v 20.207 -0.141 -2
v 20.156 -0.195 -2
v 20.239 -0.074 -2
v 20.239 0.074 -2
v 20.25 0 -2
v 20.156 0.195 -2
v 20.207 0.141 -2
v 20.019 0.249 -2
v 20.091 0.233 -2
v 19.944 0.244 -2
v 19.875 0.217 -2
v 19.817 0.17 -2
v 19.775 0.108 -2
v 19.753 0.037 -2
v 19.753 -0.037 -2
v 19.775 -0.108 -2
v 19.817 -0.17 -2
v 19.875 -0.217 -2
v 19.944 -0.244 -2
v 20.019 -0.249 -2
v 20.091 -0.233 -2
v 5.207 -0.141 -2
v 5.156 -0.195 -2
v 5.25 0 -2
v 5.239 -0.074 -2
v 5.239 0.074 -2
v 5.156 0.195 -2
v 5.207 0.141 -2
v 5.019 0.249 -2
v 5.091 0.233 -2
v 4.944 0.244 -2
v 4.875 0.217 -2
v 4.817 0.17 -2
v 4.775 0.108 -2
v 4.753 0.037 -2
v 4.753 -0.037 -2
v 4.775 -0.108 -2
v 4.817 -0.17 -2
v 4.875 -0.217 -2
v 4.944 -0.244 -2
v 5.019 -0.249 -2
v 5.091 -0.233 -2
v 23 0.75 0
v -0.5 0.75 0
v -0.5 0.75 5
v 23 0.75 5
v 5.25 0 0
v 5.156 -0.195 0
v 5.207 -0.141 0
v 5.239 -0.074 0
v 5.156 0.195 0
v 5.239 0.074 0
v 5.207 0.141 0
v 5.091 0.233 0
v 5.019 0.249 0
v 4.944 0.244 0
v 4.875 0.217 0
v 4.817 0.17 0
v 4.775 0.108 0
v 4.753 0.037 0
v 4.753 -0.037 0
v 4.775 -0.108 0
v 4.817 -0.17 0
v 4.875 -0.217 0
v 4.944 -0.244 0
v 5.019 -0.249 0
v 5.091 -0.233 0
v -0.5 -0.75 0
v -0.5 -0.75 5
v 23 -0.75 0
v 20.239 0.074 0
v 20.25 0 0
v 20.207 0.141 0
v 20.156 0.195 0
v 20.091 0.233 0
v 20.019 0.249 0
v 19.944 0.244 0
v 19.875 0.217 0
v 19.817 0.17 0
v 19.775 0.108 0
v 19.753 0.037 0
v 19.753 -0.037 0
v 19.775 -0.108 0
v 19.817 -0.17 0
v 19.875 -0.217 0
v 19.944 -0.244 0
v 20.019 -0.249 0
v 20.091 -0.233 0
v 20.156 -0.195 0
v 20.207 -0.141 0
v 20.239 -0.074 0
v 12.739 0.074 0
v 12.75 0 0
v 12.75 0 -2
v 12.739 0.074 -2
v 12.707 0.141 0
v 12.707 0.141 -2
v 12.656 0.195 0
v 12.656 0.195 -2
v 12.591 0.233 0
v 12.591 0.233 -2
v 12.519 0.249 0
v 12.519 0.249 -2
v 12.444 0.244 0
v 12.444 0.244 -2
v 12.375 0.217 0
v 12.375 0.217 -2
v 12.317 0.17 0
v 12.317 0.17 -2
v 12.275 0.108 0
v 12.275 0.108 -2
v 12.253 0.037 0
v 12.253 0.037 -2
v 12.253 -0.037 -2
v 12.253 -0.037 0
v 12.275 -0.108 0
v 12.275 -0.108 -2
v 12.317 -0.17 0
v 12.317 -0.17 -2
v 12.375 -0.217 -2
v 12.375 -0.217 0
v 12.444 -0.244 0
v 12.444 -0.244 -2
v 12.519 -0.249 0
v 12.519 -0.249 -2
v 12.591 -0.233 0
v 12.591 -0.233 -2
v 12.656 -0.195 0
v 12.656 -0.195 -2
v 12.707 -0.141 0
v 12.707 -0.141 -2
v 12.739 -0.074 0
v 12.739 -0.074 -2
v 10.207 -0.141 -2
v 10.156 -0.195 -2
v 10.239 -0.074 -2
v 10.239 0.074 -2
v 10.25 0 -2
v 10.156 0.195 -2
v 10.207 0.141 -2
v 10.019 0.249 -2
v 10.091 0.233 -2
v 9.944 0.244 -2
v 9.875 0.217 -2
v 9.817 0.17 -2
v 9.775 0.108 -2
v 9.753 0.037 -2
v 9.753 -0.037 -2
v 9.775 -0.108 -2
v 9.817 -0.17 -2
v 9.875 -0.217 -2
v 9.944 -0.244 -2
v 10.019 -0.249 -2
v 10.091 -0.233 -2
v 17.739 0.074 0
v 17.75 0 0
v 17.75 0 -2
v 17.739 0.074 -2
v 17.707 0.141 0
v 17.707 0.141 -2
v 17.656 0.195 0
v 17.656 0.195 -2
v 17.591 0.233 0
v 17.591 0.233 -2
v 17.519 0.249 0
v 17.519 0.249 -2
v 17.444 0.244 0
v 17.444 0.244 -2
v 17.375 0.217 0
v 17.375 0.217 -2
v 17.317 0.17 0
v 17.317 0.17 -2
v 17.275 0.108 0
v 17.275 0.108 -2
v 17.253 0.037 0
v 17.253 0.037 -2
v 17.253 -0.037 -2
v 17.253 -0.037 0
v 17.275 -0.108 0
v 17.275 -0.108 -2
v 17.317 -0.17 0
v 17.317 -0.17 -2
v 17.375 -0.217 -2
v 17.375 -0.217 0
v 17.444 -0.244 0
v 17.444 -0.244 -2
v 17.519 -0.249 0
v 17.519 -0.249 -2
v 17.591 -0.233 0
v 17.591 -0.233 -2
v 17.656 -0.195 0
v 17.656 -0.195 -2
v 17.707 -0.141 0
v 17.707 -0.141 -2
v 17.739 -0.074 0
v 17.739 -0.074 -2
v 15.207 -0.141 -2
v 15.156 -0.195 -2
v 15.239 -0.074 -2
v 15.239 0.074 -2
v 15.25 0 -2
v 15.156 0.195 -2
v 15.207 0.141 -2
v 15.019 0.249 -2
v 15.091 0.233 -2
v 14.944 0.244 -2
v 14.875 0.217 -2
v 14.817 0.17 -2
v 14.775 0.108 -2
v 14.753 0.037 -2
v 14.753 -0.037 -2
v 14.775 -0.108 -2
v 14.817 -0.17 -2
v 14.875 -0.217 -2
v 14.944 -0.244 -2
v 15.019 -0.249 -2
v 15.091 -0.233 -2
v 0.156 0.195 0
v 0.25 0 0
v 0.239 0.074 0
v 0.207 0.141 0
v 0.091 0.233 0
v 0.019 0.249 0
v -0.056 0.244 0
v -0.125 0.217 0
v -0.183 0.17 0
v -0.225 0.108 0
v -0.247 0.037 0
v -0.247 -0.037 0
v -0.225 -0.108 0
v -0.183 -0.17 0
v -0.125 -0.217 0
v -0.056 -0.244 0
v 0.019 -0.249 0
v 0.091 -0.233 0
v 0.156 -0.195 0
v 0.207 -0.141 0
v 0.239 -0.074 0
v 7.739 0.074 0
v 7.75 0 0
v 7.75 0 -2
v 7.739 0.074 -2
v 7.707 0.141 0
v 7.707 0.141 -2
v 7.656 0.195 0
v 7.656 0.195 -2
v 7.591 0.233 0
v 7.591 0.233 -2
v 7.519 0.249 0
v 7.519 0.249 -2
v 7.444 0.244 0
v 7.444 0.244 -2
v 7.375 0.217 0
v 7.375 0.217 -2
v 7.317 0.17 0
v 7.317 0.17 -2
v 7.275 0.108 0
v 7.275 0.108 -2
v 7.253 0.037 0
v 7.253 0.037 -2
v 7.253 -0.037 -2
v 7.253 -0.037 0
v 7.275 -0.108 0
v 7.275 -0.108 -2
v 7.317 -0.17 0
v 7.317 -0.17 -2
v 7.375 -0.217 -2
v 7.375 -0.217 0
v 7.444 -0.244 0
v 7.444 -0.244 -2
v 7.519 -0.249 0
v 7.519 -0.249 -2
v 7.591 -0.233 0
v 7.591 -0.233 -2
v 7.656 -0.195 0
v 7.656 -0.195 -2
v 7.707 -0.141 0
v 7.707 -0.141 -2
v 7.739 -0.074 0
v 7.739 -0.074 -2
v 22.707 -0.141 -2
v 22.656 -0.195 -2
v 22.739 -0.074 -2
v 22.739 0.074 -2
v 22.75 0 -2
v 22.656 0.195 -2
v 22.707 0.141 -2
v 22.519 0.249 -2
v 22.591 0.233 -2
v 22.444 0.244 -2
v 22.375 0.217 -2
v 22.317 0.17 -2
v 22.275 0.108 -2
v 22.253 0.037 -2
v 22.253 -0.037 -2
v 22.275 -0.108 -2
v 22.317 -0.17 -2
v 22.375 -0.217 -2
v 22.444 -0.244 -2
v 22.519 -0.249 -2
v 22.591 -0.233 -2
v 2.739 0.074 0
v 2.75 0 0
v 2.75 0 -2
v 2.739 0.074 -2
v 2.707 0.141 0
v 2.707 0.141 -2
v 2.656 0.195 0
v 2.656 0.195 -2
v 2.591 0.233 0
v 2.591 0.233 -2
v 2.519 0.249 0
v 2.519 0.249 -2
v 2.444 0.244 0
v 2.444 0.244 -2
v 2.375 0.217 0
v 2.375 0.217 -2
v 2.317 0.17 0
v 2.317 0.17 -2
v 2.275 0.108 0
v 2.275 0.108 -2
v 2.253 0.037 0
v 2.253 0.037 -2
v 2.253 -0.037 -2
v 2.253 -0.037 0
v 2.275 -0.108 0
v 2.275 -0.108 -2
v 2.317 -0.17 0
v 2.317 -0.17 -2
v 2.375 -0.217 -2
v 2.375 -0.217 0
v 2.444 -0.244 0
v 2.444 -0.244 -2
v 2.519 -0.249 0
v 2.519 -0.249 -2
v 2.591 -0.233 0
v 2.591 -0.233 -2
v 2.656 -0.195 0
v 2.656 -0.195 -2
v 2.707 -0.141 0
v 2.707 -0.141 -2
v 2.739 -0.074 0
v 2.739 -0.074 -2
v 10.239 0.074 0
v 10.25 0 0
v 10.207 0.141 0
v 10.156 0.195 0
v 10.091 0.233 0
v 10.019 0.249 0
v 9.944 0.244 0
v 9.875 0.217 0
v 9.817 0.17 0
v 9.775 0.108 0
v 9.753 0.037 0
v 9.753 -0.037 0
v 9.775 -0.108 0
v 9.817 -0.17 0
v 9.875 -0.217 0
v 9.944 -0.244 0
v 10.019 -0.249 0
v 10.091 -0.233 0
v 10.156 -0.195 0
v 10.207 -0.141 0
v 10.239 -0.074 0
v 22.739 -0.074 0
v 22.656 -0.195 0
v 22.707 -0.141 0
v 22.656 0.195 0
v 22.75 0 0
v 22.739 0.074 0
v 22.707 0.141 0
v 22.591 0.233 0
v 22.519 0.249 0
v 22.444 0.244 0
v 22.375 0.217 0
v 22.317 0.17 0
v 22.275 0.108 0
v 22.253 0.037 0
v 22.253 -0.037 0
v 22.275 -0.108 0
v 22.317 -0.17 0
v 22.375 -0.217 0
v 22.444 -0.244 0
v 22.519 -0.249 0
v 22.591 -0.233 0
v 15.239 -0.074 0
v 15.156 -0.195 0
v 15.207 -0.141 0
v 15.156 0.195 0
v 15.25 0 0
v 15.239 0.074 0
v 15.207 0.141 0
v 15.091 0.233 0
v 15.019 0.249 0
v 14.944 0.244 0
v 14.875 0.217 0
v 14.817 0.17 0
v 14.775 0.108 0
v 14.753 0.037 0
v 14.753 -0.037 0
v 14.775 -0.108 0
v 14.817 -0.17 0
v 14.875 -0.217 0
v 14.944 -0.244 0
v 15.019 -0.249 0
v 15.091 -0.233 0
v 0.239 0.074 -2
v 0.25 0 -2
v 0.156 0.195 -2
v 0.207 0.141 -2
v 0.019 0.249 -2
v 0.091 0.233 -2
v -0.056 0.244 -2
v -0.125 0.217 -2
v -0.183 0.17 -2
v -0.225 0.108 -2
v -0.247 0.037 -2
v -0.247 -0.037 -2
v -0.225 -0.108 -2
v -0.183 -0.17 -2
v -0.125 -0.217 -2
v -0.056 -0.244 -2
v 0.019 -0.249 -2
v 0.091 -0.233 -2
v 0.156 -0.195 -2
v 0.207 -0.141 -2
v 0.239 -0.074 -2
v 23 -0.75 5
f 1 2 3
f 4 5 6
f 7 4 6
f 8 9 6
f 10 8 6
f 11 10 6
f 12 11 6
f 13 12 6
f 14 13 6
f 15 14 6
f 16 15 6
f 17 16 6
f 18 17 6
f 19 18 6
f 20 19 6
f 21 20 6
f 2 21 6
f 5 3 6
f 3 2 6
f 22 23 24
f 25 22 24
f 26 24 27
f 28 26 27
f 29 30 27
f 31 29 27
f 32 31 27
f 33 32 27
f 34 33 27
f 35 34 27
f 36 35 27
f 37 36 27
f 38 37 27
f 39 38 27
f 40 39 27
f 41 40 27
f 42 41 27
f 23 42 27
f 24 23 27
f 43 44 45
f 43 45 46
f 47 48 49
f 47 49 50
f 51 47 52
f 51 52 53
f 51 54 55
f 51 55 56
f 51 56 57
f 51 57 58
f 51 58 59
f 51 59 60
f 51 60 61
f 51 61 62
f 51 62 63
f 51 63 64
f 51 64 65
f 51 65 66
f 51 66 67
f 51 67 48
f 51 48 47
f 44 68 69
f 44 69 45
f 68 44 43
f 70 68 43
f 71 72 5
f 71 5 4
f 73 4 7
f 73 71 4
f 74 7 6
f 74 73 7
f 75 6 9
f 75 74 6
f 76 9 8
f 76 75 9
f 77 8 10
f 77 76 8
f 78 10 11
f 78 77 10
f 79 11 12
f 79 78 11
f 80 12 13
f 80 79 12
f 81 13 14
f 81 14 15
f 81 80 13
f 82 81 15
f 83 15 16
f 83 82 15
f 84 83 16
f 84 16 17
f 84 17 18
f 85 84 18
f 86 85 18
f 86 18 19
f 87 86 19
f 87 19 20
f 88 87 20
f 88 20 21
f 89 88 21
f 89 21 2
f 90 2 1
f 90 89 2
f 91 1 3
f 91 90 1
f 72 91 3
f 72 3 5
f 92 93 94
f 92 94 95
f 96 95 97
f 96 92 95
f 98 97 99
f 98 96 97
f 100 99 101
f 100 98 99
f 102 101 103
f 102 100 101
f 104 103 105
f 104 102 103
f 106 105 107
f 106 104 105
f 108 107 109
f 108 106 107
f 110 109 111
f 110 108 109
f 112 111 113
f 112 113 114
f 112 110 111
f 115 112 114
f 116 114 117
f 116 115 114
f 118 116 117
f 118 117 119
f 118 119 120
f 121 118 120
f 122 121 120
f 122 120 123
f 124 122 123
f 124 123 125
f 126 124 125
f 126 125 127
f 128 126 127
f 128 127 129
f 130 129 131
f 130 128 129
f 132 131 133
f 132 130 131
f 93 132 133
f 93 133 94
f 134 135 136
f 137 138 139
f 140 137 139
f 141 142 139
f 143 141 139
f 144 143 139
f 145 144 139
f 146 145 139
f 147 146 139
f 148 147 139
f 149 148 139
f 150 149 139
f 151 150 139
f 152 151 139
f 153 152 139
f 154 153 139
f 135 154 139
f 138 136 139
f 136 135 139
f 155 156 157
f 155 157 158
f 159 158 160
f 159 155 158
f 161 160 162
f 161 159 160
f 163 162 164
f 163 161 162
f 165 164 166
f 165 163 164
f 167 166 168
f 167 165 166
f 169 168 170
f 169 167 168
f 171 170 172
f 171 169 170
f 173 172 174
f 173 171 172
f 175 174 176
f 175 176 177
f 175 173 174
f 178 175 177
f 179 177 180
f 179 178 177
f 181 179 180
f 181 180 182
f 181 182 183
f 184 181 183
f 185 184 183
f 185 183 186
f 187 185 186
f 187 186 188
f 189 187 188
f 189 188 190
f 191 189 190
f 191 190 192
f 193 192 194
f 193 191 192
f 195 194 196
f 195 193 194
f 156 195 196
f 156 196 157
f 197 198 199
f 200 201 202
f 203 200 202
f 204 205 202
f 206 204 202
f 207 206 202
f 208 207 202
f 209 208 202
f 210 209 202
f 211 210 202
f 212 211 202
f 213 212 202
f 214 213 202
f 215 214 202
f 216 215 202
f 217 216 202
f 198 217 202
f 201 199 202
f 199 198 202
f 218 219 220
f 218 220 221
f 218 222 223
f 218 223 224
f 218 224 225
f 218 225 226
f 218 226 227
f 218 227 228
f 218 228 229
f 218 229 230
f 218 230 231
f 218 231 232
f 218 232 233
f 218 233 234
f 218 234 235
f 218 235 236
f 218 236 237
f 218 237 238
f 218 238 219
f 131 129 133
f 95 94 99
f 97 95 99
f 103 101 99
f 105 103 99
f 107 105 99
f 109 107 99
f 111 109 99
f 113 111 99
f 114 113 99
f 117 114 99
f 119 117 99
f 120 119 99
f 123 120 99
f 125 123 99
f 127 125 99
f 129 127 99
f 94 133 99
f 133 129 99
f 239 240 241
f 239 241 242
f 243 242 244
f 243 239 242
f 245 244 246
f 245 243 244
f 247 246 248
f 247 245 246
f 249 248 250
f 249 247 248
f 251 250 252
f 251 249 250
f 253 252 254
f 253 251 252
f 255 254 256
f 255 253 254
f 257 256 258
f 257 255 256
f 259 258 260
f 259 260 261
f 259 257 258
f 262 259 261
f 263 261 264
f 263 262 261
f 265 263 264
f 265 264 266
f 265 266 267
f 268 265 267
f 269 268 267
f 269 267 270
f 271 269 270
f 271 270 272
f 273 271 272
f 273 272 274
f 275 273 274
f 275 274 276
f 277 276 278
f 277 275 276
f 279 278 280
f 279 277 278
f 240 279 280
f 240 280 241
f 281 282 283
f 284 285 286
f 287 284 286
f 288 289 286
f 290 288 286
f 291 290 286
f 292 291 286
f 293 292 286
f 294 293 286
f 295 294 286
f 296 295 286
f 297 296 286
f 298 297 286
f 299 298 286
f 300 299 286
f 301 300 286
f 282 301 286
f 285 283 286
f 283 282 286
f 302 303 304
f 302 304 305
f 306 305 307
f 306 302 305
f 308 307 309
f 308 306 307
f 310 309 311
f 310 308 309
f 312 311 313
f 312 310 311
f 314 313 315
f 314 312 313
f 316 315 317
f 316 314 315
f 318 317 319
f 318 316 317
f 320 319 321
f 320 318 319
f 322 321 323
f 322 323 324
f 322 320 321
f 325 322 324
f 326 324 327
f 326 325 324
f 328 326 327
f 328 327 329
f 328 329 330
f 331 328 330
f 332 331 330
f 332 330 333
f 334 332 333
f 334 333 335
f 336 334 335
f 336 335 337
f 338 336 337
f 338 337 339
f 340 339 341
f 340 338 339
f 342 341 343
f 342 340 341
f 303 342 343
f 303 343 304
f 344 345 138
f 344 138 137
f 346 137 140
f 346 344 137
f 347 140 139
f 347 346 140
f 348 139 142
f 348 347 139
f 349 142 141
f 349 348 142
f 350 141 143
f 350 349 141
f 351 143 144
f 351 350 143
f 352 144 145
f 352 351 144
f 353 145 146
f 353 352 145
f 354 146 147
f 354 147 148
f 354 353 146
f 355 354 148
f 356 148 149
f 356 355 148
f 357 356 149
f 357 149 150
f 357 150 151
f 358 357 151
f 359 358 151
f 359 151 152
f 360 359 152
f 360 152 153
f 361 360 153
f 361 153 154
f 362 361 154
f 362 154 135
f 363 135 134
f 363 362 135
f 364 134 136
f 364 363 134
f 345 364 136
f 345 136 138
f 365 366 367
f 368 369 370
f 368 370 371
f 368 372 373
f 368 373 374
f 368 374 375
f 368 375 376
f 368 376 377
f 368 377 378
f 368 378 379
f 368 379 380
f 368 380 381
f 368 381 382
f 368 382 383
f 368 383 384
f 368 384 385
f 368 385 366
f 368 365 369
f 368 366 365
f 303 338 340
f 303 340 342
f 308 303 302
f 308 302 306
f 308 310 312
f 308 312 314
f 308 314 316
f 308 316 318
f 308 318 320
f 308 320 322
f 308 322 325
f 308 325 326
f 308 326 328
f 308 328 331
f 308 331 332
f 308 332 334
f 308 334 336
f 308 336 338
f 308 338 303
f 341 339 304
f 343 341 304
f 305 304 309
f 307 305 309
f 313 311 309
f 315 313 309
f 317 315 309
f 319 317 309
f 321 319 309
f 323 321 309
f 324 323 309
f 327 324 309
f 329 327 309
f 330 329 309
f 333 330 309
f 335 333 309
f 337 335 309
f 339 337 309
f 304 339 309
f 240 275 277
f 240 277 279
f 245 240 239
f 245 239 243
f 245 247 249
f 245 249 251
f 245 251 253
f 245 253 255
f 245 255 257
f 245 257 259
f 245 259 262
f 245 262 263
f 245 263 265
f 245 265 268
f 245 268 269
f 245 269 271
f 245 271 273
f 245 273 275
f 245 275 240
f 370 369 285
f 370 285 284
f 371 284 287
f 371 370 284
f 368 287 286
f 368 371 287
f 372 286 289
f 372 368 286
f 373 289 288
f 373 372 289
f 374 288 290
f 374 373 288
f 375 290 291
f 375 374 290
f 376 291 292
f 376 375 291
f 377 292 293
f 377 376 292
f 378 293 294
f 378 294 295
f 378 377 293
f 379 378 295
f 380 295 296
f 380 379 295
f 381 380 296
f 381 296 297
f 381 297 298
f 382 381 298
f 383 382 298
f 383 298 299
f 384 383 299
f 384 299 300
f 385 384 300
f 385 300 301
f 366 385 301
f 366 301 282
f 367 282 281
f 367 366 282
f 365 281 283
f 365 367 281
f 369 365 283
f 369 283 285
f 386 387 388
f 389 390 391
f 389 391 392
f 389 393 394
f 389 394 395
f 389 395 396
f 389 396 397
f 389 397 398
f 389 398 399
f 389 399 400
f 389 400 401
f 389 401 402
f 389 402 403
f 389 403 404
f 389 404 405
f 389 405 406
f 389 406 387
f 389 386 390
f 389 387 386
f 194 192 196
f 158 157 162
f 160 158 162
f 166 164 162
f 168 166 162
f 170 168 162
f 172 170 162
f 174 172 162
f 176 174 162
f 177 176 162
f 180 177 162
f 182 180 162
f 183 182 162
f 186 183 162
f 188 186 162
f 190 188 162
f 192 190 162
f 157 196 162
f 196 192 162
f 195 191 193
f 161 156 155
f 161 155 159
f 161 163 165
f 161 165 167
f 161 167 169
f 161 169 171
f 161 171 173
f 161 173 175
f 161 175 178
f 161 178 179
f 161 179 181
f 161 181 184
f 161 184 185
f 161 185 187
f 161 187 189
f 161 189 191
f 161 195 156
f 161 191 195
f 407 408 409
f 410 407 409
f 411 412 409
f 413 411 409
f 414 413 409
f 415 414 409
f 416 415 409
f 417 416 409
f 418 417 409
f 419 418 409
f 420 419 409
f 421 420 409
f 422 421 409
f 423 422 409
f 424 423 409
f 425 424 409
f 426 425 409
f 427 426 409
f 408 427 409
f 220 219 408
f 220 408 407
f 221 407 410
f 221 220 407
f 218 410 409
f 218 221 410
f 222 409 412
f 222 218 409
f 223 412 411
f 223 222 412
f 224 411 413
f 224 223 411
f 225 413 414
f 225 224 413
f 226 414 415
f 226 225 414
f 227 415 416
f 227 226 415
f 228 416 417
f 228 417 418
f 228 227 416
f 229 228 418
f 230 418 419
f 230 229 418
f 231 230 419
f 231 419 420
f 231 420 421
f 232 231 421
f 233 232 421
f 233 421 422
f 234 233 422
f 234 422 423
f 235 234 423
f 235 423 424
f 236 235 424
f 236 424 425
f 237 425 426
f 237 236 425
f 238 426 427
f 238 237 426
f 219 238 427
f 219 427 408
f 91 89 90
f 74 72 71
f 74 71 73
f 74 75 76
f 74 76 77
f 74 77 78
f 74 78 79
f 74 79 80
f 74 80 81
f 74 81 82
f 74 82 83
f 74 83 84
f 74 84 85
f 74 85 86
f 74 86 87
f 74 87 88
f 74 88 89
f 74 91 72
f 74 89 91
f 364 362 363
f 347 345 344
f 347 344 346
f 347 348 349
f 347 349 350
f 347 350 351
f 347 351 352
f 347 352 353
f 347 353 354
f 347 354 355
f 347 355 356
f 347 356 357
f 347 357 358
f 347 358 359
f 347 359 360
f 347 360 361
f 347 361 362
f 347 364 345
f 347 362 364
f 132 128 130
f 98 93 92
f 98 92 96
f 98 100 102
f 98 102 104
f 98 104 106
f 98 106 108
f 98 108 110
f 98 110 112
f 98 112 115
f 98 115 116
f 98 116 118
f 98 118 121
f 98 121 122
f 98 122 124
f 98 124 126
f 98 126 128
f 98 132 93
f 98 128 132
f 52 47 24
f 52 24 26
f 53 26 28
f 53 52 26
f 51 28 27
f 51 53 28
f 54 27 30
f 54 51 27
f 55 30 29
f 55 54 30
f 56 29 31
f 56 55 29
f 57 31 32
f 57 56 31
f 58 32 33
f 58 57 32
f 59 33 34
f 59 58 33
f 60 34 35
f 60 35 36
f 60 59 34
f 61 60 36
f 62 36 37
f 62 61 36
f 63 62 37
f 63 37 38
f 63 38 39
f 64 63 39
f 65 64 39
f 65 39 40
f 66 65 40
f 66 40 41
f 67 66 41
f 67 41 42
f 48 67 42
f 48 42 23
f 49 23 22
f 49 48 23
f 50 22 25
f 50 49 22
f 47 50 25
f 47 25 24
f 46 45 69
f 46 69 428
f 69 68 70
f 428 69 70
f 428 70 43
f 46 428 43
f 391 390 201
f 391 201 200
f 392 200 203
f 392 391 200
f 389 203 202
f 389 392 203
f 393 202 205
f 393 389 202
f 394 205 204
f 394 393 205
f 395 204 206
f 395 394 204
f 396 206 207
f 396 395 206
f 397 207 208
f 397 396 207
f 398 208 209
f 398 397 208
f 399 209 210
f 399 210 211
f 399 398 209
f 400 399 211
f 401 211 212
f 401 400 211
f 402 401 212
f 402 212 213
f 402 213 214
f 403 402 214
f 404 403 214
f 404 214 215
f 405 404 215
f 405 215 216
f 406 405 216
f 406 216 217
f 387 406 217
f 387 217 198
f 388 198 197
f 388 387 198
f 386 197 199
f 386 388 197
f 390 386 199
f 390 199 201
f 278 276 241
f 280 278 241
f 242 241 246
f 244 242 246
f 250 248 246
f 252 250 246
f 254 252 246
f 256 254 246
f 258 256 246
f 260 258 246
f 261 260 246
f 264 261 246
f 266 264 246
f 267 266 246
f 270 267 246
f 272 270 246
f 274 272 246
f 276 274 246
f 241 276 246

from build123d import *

# Parameters (mm, degrees)
SKETCH1_W               = 23.5
SKETCH1_H               = 1.5
COMPONENT_OUTLINE_DEPTH = 5
SKETCH2_R               = 0.25
EXTRUDE_1_DEPTH         = 2
SKETCH3_R               = 0.25
EXTRUDE_2_DEPTH         = 2
SKETCH4_R               = 0.25
EXTRUDE_3_DEPTH         = 2
SKETCH5_R               = 0.25
EXTRUDE_4_DEPTH         = 2
SKETCH6_R               = 0.25
EXTRUDE_5_DEPTH         = 2
SKETCH7_R               = 0.25
EXTRUDE_6_DEPTH         = 2
SKETCH8_R               = 0.25
EXTRUDE_7_DEPTH         = 2
SKETCH9_R               = 0.25
EXTRUDE_8_DEPTH         = 2
SKETCH10_R              = 0.25
EXTRUDE_9_DEPTH         = 2
SKETCH11_R              = 0.25
EXTRUDE_10_DEPTH        = 2


with BuildPart() as part:
    # Sketch1 → Component_Outline (new body)
    with BuildSketch(Plane.XY):
        with Locations((11.25, 0)):
            Rectangle(SKETCH1_W, SKETCH1_H)
    extrude(amount=COMPONENT_OUTLINE_DEPTH)


with BuildPart() as body_2:
    # Sketch2 → Extrude 1 (new body)
    with BuildSketch(Plane.XY):
        Circle(SKETCH2_R)
    extrude(amount=-EXTRUDE_1_DEPTH)


with BuildPart() as body_3:
    # Sketch3 → Extrude 2 (new body)
    with BuildSketch(Plane.XY):
        with Locations((2.5, 0)):
            Circle(SKETCH3_R)
    extrude(amount=-EXTRUDE_2_DEPTH)


with BuildPart() as body_4:
    # Sketch4 → Extrude 3 (new body)
    with BuildSketch(Plane.XY):
        with Locations((5, 0)):
            Circle(SKETCH4_R)
    extrude(amount=-EXTRUDE_3_DEPTH)


with BuildPart() as body_5:
    # Sketch5 → Extrude 4 (new body)
    with BuildSketch(Plane.XY):
        with Locations((7.5, 0)):
            Circle(SKETCH5_R)
    extrude(amount=-EXTRUDE_4_DEPTH)


with BuildPart() as body_6:
    # Sketch6 → Extrude 5 (new body)
    with BuildSketch(Plane.XY):
        with Locations((10, 0)):
            Circle(SKETCH6_R)
    extrude(amount=-EXTRUDE_5_DEPTH)


with BuildPart() as body_7:
    # Sketch7 → Extrude 6 (new body)
    with BuildSketch(Plane.XY):
        with Locations((12.5, 0)):
            Circle(SKETCH7_R)
    extrude(amount=-EXTRUDE_6_DEPTH)


with BuildPart() as body_8:
    # Sketch8 → Extrude 7 (new body)
    with BuildSketch(Plane.XY):
        with Locations((15, 0)):
            Circle(SKETCH8_R)
    extrude(amount=-EXTRUDE_7_DEPTH)


with BuildPart() as body_9:
    # Sketch9 → Extrude 8 (new body)
    with BuildSketch(Plane.XY):
        with Locations((17.5, 0)):
            Circle(SKETCH9_R)
    extrude(amount=-EXTRUDE_8_DEPTH)


with BuildPart() as body_10:
    # Sketch10 → Extrude 9 (new body)
    with BuildSketch(Plane.XY):
        with Locations((20, 0)):
            Circle(SKETCH10_R)
    extrude(amount=-EXTRUDE_9_DEPTH)


with BuildPart() as body_11:
    # Sketch11 → Extrude 10 (new body)
    with BuildSketch(Plane.XY):
        with Locations((22.5, 0)):
            Circle(SKETCH11_R)
    extrude(amount=-EXTRUDE_10_DEPTH)


solid = Compound([part.part, body_2.part, body_3.part, body_4.part, body_5.part, body_6.part, body_7.part, body_8.part, body_9.part, body_10.part, body_11.part])
